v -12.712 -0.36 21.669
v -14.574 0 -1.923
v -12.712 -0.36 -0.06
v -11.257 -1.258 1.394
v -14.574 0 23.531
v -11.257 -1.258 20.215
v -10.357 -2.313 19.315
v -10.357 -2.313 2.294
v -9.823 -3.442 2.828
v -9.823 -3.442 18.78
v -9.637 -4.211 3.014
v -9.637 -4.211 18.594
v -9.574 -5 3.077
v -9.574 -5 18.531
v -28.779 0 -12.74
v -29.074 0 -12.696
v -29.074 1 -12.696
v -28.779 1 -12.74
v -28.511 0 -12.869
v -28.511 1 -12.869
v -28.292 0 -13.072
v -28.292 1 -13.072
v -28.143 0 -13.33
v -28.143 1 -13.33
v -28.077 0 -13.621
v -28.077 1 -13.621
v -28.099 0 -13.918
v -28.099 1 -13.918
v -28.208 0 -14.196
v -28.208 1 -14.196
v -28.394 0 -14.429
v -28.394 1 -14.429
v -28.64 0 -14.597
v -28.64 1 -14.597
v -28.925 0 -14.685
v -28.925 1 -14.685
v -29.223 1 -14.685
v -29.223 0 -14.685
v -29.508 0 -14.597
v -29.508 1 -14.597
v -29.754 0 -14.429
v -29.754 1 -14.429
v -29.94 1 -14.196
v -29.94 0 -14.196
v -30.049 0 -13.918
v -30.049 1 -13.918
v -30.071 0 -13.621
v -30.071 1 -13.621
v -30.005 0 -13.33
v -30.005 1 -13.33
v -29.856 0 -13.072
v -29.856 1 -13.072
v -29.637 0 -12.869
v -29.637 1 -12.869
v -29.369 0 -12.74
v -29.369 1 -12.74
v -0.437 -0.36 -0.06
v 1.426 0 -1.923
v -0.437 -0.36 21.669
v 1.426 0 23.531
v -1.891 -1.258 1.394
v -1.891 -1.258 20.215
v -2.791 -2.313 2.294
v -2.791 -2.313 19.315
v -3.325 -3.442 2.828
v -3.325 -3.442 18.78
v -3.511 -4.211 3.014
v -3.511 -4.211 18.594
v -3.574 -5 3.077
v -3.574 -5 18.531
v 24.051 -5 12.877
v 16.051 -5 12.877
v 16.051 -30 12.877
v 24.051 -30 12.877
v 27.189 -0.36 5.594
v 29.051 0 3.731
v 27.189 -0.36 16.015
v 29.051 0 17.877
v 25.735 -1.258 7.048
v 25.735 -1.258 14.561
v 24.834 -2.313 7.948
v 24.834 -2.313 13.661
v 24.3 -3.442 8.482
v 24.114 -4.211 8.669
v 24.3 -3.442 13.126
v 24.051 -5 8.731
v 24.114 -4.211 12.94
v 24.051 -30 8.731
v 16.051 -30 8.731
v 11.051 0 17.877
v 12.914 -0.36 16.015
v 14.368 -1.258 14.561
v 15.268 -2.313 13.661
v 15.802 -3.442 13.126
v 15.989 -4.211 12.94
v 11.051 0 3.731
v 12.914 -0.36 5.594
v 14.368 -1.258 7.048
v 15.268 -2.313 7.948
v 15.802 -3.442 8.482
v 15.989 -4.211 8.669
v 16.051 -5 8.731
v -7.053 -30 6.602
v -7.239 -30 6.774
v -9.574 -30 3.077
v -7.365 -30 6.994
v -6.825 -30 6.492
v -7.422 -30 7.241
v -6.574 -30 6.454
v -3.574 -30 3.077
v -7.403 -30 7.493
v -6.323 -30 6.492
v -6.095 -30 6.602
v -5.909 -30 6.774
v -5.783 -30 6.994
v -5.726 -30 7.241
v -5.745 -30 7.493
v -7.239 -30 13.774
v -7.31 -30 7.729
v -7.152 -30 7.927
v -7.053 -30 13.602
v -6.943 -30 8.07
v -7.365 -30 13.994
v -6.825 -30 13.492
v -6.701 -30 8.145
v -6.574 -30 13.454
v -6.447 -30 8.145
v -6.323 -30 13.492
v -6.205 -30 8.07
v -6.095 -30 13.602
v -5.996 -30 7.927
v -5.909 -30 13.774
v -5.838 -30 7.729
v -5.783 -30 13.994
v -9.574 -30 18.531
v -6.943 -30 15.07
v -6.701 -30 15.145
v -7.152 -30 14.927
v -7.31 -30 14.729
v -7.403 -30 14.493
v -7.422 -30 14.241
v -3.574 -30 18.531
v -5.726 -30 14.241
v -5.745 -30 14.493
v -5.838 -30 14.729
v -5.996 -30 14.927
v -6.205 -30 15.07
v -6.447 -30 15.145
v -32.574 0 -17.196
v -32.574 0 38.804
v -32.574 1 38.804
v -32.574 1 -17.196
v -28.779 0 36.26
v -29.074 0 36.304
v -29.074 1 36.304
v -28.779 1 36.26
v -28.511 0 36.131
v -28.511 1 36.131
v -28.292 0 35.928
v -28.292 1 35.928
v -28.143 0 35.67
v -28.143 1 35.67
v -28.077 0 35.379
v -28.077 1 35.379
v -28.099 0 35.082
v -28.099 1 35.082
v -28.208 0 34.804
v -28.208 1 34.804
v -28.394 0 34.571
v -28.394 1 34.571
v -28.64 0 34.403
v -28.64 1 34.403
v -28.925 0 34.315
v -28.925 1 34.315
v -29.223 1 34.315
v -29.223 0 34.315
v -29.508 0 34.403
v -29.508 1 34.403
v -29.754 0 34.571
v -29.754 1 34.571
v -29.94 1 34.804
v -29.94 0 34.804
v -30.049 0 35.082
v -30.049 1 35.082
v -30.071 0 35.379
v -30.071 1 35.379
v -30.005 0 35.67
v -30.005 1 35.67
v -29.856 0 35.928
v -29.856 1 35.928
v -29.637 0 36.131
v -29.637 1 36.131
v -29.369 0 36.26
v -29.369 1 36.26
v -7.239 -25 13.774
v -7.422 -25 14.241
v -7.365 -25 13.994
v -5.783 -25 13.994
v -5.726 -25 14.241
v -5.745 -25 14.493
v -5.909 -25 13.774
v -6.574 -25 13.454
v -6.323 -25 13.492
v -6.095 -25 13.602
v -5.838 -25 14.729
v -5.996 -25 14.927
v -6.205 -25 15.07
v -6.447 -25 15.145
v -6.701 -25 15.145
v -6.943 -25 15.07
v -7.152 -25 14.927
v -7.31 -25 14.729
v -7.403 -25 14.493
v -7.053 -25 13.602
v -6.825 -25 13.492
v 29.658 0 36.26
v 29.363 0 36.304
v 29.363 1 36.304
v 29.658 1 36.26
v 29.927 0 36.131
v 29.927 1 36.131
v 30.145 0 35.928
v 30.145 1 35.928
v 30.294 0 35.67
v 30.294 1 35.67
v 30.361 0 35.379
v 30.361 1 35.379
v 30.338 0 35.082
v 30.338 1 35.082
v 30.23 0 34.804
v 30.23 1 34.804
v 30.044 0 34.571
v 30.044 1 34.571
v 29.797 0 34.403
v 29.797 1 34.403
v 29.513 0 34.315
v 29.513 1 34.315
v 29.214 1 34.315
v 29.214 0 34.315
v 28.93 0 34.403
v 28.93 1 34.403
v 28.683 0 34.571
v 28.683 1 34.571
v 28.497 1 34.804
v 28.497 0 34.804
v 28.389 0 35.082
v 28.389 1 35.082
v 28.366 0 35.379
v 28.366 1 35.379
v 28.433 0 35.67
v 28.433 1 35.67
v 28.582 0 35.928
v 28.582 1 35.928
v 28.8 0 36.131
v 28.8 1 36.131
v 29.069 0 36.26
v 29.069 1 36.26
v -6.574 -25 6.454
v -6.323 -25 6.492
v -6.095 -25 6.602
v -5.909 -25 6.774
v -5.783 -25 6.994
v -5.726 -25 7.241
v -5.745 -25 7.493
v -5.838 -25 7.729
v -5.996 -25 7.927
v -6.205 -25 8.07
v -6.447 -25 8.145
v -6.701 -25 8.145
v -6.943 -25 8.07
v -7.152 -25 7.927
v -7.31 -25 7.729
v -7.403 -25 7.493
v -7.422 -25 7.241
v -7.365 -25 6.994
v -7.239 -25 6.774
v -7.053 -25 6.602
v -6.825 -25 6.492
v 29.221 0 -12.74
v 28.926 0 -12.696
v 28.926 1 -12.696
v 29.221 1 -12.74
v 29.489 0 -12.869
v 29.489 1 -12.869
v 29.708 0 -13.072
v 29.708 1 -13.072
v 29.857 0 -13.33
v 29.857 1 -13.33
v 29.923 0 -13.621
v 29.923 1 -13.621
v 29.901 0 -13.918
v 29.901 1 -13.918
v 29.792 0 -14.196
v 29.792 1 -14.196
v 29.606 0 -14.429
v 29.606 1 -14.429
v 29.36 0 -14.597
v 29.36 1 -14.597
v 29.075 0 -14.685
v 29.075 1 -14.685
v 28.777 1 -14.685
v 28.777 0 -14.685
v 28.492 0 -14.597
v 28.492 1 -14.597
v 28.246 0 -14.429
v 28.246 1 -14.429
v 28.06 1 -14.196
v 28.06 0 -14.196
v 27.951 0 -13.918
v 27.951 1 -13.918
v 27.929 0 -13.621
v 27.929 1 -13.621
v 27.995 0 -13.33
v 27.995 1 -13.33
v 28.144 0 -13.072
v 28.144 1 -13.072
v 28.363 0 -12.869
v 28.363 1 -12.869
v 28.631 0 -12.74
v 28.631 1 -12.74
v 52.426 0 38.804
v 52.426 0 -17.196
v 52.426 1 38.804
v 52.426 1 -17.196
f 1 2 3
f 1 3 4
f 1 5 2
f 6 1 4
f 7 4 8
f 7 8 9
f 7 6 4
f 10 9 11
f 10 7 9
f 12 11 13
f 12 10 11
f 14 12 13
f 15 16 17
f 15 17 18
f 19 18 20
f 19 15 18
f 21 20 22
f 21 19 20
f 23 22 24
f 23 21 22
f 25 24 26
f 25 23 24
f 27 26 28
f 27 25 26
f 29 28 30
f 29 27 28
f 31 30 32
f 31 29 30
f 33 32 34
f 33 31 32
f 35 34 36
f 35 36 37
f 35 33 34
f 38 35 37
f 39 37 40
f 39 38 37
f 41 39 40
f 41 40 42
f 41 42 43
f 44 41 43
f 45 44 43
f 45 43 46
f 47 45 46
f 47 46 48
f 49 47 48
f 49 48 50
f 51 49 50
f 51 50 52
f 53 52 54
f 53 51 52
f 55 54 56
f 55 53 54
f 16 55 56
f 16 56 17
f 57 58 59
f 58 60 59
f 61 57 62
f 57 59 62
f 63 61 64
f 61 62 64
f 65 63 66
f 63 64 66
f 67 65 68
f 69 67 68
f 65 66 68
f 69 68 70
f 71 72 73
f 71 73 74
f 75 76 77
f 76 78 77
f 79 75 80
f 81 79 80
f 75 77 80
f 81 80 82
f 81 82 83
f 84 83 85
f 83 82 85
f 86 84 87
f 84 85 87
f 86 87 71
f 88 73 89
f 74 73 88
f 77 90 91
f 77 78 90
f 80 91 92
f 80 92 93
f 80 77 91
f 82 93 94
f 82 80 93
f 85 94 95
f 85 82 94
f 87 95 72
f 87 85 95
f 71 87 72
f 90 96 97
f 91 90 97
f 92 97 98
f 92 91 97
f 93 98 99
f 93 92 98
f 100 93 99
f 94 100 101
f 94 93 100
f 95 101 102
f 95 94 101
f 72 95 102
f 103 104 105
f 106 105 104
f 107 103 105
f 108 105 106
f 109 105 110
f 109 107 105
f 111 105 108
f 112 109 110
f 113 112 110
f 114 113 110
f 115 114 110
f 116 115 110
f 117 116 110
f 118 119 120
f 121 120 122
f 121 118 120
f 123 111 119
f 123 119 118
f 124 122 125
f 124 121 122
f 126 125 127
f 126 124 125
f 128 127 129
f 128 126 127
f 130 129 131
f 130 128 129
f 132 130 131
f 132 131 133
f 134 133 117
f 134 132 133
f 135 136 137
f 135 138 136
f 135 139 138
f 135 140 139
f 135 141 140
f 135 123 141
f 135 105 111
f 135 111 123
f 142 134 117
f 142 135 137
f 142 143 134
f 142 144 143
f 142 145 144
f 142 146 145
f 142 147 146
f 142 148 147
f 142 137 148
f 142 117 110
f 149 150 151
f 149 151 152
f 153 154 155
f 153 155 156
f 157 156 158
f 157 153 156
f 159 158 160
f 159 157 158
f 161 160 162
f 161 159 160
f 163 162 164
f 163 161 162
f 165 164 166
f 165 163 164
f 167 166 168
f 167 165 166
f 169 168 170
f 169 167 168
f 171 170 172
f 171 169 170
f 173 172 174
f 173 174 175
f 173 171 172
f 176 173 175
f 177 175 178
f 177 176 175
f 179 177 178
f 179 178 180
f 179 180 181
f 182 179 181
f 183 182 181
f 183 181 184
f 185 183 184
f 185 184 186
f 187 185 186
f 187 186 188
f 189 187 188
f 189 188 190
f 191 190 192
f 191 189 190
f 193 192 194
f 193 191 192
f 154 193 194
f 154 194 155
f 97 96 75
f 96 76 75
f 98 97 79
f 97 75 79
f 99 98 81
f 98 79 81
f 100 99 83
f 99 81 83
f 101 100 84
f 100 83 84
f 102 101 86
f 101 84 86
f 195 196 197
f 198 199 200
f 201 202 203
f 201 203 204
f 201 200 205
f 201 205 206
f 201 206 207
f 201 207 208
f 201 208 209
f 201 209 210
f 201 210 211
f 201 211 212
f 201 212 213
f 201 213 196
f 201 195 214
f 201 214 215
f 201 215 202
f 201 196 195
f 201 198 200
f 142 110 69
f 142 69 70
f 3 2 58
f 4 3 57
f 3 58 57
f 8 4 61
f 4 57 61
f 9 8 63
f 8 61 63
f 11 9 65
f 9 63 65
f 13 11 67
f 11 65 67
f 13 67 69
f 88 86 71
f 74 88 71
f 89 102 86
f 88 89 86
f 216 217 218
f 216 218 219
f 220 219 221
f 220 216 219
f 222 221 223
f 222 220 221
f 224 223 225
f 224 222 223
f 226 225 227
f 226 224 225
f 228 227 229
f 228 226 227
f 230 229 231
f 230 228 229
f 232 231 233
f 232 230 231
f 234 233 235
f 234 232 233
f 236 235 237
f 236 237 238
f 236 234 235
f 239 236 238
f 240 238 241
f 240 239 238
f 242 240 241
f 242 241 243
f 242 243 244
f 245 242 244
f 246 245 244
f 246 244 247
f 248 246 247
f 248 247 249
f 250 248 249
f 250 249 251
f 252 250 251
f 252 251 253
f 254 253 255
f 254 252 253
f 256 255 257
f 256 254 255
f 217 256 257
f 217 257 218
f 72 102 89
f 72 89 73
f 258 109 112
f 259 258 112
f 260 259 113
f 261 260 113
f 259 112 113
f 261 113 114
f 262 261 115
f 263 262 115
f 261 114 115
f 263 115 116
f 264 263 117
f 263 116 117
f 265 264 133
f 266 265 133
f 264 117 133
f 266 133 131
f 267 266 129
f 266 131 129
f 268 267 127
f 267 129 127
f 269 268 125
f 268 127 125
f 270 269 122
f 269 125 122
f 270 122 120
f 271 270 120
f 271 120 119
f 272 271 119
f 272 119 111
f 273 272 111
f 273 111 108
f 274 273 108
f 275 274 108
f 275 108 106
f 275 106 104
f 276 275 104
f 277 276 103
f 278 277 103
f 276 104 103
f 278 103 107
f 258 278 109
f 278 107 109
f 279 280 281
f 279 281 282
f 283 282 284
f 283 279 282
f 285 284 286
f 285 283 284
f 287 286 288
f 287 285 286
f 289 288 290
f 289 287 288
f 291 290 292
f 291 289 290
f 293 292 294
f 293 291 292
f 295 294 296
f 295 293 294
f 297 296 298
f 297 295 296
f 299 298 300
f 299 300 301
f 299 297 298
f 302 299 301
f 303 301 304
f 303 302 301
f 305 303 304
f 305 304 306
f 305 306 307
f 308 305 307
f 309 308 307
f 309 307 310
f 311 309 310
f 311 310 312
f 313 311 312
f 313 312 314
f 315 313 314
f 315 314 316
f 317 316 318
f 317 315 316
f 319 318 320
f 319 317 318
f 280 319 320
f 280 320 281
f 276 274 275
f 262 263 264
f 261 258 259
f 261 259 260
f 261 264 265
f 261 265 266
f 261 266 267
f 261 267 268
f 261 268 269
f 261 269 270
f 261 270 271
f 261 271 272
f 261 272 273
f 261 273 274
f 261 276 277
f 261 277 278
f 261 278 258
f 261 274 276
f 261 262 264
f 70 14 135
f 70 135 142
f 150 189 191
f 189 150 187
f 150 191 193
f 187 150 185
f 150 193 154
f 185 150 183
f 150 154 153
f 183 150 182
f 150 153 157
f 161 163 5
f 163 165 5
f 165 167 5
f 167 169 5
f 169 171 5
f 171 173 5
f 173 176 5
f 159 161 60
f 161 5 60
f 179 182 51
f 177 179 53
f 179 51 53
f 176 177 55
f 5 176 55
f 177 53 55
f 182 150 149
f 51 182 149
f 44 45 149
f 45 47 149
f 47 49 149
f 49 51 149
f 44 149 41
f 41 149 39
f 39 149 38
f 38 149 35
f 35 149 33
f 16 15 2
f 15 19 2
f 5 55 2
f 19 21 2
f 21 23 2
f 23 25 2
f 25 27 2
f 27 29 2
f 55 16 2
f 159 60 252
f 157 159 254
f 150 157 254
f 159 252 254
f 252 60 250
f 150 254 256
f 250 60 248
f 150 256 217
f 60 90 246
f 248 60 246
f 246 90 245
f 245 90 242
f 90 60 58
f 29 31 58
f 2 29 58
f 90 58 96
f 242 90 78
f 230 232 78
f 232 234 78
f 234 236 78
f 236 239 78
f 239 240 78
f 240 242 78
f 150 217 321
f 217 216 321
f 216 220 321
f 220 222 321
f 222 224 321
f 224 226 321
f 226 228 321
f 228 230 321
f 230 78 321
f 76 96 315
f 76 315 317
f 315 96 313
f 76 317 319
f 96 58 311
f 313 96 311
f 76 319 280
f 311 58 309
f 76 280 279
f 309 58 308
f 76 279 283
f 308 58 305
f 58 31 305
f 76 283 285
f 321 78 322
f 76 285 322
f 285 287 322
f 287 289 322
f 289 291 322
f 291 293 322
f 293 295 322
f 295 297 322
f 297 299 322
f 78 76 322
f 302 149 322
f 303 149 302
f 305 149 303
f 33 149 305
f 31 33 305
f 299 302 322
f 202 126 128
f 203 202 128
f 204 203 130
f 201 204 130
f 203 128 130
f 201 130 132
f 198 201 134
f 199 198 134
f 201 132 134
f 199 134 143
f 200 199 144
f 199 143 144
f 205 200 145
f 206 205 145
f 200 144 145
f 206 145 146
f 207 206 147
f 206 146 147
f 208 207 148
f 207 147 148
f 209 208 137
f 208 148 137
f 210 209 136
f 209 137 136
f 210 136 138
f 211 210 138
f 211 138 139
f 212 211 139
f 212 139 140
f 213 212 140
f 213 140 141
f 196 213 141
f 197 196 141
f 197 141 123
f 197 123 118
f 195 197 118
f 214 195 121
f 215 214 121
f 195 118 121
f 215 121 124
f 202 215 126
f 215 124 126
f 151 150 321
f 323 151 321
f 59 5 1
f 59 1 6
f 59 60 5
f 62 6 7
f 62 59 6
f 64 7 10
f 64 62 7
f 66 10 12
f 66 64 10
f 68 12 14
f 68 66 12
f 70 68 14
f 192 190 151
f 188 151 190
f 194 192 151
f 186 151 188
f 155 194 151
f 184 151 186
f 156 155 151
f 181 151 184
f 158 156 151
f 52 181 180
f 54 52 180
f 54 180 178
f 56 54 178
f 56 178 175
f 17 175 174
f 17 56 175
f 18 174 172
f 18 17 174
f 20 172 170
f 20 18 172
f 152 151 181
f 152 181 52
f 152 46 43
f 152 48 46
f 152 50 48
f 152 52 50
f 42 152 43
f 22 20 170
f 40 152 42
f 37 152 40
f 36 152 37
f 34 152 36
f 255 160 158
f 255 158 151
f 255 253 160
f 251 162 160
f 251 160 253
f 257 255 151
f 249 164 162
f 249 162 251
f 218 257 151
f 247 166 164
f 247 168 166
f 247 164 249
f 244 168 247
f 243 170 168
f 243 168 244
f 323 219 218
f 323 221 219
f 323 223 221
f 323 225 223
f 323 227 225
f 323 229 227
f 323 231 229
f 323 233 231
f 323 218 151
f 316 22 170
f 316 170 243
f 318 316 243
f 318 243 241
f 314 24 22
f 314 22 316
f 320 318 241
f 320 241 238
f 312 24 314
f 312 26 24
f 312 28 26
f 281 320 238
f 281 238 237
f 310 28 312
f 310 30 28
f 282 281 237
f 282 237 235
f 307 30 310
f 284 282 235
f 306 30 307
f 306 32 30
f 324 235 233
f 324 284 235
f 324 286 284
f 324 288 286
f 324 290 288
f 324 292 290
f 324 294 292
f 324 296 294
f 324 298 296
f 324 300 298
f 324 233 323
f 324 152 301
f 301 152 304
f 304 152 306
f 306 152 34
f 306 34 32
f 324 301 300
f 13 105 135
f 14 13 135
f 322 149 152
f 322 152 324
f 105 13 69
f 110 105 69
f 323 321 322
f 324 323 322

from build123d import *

# Parameters (mm, degrees)
ESQUISSE1_W             = 85
ESQUISSE1_H             = 56
ESQUISSE1_R             = 1
BOSS_EXTRU_1_DEPTH      = 1
ESQUISSE2_W             = 6
ESQUISSE2_H             = 15.454409224
ESQUISSE2_W_2           = 8
ESQUISSE2_H_2           = 4.146304914
BOSS_EXTRU_2_DEPTH      = 30
CONG_1_R                = 5
ESQUISSE3_R             = 0.85
ENL_V_MAT_EXTRU_1_DEPTH = 5


with BuildPart() as part:
    # Esquisse1 → Boss.-Extru.1 (new body)
    with BuildSketch(Plane(origin=(0, 0, 0), x_dir=(1, 0, 0), z_dir=(0, 1, 0))):
        with Locations((9.925986842, -10.804276316)):
            Rectangle(ESQUISSE1_W, ESQUISSE1_H)
        with Locations(Location((-29.074013158, 13.695723684, 0), (0, 0, 270))):
            Circle(ESQUISSE1_R, mode=Mode.SUBTRACT)
        with Locations(Location((28.925986842, 13.695723684, 0), (0, 0, 270))):
            Circle(ESQUISSE1_R, mode=Mode.SUBTRACT)
        with Locations(Location((29.363486842, -35.304276316, 0), (0, 0, 270))):
            Circle(ESQUISSE1_R, mode=Mode.SUBTRACT)
        with Locations(Location((-29.074013158, -35.304276316, 0), (0, 0, 270))):
            Circle(ESQUISSE1_R, mode=Mode.SUBTRACT)
    extrude(amount=BOSS_EXTRU_1_DEPTH)

    # Esquisse2 → Boss.-Extru.2 (add)
    with BuildSketch(Plane.XZ):
        with Locations((-6.574013158, 10.804276316)):
            Rectangle(ESQUISSE2_W, ESQUISSE2_H)
        with Locations((20.05121001, 10.804276316)):
            Rectangle(ESQUISSE2_W_2, ESQUISSE2_H_2)
    extrude(amount=BOSS_EXTRU_2_DEPTH)

    # Congé1
    cong_1_edges = [part.edges().sort_by_distance(p)[0] for p in [
        (-9.574013158, 0, 10.804276316),
        (-6.574013158, 0, 3.077071704),
        (-3.574013158, 0, 10.804276316),
        (-6.574013158, 0, 18.531480928),
        (16.05121001, 0, 10.804276316),
        (20.05121001, 0, 8.731123859),
        (24.05121001, 0, 10.804276316),
        (20.05121001, 0, 12.877428773),
    ]]
    fillet(cong_1_edges, radius=CONG_1_R)

    # Esquisse3 → Enlèv. mat.-Extru.1 (cut)
    with BuildSketch(Plane.XZ.offset(30)):
        with Locations(Location((-6.574013158, 14.304276316, 0), (0, 0, 270))):
            Circle(ESQUISSE3_R)
        with Locations(Location((-6.574013158, 7.304276316, 0), (0, 0, 270))):
            Circle(ESQUISSE3_R)
    extrude(amount=-ENL_V_MAT_EXTRU_1_DEPTH, mode=Mode.SUBTRACT)


solid = part.part
